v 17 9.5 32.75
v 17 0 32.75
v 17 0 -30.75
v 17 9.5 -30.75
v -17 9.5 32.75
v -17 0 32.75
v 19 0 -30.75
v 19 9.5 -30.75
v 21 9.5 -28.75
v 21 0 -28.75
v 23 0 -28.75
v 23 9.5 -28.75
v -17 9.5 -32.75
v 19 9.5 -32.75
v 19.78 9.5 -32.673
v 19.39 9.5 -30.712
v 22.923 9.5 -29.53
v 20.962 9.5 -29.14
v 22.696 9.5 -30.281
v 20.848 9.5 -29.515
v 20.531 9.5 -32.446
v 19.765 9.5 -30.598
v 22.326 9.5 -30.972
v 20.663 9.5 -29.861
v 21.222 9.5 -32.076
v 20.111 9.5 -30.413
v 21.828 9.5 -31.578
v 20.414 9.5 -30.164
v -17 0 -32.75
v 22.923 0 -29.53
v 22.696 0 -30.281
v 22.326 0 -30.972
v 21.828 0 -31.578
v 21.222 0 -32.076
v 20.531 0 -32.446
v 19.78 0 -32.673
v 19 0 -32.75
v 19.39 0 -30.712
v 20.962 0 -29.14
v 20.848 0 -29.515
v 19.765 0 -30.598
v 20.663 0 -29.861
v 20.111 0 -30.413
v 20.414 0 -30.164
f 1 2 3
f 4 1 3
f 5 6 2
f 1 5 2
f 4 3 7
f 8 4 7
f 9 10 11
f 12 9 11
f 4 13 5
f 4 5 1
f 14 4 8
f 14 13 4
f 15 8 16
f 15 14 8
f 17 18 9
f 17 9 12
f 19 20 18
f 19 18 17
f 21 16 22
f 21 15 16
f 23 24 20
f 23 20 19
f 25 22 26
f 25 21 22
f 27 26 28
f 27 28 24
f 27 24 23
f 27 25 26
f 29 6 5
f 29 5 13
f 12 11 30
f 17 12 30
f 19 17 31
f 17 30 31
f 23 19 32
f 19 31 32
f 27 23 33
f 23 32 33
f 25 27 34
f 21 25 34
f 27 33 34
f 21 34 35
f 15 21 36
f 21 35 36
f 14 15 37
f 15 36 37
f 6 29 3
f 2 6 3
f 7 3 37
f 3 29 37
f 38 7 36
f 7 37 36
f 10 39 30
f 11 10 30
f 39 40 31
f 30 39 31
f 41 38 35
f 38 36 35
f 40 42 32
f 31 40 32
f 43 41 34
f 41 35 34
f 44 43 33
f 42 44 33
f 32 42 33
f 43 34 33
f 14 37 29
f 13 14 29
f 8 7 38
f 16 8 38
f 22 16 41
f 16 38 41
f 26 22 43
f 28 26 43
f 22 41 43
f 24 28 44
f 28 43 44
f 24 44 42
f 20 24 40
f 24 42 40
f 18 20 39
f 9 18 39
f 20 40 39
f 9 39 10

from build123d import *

# Parameters (mm, degrees)
SKETCH1_W           = 34
SKETCH1_H           = 65.5
BOSS_EXTRUDE1_DEPTH = 9.5


with BuildPart() as part:
    # Sketch1 → Boss-Extrude1 (new body)
    with BuildSketch(Plane(origin=(0, 0, 0), x_dir=(1, 0, 0), z_dir=(0, 1, 0))):
        Rectangle(SKETCH1_W, SKETCH1_H)
        with BuildLine():
            Line((19, 32.75), (17, 32.75))
            Line((17, 32.75), (17, 30.75))
            Line((17, 30.75), (19, 30.75))
            ThreePointArc((19, 30.75), (20.414213562, 30.164213562), (21, 28.75))
            Line((21, 28.75), (23, 28.75))
            ThreePointArc((23, 28.75), (21.828427125, 31.578427125), (19, 32.75))
        make_face()
    extrude(amount=BOSS_EXTRUDE1_DEPTH)


solid = part.part
